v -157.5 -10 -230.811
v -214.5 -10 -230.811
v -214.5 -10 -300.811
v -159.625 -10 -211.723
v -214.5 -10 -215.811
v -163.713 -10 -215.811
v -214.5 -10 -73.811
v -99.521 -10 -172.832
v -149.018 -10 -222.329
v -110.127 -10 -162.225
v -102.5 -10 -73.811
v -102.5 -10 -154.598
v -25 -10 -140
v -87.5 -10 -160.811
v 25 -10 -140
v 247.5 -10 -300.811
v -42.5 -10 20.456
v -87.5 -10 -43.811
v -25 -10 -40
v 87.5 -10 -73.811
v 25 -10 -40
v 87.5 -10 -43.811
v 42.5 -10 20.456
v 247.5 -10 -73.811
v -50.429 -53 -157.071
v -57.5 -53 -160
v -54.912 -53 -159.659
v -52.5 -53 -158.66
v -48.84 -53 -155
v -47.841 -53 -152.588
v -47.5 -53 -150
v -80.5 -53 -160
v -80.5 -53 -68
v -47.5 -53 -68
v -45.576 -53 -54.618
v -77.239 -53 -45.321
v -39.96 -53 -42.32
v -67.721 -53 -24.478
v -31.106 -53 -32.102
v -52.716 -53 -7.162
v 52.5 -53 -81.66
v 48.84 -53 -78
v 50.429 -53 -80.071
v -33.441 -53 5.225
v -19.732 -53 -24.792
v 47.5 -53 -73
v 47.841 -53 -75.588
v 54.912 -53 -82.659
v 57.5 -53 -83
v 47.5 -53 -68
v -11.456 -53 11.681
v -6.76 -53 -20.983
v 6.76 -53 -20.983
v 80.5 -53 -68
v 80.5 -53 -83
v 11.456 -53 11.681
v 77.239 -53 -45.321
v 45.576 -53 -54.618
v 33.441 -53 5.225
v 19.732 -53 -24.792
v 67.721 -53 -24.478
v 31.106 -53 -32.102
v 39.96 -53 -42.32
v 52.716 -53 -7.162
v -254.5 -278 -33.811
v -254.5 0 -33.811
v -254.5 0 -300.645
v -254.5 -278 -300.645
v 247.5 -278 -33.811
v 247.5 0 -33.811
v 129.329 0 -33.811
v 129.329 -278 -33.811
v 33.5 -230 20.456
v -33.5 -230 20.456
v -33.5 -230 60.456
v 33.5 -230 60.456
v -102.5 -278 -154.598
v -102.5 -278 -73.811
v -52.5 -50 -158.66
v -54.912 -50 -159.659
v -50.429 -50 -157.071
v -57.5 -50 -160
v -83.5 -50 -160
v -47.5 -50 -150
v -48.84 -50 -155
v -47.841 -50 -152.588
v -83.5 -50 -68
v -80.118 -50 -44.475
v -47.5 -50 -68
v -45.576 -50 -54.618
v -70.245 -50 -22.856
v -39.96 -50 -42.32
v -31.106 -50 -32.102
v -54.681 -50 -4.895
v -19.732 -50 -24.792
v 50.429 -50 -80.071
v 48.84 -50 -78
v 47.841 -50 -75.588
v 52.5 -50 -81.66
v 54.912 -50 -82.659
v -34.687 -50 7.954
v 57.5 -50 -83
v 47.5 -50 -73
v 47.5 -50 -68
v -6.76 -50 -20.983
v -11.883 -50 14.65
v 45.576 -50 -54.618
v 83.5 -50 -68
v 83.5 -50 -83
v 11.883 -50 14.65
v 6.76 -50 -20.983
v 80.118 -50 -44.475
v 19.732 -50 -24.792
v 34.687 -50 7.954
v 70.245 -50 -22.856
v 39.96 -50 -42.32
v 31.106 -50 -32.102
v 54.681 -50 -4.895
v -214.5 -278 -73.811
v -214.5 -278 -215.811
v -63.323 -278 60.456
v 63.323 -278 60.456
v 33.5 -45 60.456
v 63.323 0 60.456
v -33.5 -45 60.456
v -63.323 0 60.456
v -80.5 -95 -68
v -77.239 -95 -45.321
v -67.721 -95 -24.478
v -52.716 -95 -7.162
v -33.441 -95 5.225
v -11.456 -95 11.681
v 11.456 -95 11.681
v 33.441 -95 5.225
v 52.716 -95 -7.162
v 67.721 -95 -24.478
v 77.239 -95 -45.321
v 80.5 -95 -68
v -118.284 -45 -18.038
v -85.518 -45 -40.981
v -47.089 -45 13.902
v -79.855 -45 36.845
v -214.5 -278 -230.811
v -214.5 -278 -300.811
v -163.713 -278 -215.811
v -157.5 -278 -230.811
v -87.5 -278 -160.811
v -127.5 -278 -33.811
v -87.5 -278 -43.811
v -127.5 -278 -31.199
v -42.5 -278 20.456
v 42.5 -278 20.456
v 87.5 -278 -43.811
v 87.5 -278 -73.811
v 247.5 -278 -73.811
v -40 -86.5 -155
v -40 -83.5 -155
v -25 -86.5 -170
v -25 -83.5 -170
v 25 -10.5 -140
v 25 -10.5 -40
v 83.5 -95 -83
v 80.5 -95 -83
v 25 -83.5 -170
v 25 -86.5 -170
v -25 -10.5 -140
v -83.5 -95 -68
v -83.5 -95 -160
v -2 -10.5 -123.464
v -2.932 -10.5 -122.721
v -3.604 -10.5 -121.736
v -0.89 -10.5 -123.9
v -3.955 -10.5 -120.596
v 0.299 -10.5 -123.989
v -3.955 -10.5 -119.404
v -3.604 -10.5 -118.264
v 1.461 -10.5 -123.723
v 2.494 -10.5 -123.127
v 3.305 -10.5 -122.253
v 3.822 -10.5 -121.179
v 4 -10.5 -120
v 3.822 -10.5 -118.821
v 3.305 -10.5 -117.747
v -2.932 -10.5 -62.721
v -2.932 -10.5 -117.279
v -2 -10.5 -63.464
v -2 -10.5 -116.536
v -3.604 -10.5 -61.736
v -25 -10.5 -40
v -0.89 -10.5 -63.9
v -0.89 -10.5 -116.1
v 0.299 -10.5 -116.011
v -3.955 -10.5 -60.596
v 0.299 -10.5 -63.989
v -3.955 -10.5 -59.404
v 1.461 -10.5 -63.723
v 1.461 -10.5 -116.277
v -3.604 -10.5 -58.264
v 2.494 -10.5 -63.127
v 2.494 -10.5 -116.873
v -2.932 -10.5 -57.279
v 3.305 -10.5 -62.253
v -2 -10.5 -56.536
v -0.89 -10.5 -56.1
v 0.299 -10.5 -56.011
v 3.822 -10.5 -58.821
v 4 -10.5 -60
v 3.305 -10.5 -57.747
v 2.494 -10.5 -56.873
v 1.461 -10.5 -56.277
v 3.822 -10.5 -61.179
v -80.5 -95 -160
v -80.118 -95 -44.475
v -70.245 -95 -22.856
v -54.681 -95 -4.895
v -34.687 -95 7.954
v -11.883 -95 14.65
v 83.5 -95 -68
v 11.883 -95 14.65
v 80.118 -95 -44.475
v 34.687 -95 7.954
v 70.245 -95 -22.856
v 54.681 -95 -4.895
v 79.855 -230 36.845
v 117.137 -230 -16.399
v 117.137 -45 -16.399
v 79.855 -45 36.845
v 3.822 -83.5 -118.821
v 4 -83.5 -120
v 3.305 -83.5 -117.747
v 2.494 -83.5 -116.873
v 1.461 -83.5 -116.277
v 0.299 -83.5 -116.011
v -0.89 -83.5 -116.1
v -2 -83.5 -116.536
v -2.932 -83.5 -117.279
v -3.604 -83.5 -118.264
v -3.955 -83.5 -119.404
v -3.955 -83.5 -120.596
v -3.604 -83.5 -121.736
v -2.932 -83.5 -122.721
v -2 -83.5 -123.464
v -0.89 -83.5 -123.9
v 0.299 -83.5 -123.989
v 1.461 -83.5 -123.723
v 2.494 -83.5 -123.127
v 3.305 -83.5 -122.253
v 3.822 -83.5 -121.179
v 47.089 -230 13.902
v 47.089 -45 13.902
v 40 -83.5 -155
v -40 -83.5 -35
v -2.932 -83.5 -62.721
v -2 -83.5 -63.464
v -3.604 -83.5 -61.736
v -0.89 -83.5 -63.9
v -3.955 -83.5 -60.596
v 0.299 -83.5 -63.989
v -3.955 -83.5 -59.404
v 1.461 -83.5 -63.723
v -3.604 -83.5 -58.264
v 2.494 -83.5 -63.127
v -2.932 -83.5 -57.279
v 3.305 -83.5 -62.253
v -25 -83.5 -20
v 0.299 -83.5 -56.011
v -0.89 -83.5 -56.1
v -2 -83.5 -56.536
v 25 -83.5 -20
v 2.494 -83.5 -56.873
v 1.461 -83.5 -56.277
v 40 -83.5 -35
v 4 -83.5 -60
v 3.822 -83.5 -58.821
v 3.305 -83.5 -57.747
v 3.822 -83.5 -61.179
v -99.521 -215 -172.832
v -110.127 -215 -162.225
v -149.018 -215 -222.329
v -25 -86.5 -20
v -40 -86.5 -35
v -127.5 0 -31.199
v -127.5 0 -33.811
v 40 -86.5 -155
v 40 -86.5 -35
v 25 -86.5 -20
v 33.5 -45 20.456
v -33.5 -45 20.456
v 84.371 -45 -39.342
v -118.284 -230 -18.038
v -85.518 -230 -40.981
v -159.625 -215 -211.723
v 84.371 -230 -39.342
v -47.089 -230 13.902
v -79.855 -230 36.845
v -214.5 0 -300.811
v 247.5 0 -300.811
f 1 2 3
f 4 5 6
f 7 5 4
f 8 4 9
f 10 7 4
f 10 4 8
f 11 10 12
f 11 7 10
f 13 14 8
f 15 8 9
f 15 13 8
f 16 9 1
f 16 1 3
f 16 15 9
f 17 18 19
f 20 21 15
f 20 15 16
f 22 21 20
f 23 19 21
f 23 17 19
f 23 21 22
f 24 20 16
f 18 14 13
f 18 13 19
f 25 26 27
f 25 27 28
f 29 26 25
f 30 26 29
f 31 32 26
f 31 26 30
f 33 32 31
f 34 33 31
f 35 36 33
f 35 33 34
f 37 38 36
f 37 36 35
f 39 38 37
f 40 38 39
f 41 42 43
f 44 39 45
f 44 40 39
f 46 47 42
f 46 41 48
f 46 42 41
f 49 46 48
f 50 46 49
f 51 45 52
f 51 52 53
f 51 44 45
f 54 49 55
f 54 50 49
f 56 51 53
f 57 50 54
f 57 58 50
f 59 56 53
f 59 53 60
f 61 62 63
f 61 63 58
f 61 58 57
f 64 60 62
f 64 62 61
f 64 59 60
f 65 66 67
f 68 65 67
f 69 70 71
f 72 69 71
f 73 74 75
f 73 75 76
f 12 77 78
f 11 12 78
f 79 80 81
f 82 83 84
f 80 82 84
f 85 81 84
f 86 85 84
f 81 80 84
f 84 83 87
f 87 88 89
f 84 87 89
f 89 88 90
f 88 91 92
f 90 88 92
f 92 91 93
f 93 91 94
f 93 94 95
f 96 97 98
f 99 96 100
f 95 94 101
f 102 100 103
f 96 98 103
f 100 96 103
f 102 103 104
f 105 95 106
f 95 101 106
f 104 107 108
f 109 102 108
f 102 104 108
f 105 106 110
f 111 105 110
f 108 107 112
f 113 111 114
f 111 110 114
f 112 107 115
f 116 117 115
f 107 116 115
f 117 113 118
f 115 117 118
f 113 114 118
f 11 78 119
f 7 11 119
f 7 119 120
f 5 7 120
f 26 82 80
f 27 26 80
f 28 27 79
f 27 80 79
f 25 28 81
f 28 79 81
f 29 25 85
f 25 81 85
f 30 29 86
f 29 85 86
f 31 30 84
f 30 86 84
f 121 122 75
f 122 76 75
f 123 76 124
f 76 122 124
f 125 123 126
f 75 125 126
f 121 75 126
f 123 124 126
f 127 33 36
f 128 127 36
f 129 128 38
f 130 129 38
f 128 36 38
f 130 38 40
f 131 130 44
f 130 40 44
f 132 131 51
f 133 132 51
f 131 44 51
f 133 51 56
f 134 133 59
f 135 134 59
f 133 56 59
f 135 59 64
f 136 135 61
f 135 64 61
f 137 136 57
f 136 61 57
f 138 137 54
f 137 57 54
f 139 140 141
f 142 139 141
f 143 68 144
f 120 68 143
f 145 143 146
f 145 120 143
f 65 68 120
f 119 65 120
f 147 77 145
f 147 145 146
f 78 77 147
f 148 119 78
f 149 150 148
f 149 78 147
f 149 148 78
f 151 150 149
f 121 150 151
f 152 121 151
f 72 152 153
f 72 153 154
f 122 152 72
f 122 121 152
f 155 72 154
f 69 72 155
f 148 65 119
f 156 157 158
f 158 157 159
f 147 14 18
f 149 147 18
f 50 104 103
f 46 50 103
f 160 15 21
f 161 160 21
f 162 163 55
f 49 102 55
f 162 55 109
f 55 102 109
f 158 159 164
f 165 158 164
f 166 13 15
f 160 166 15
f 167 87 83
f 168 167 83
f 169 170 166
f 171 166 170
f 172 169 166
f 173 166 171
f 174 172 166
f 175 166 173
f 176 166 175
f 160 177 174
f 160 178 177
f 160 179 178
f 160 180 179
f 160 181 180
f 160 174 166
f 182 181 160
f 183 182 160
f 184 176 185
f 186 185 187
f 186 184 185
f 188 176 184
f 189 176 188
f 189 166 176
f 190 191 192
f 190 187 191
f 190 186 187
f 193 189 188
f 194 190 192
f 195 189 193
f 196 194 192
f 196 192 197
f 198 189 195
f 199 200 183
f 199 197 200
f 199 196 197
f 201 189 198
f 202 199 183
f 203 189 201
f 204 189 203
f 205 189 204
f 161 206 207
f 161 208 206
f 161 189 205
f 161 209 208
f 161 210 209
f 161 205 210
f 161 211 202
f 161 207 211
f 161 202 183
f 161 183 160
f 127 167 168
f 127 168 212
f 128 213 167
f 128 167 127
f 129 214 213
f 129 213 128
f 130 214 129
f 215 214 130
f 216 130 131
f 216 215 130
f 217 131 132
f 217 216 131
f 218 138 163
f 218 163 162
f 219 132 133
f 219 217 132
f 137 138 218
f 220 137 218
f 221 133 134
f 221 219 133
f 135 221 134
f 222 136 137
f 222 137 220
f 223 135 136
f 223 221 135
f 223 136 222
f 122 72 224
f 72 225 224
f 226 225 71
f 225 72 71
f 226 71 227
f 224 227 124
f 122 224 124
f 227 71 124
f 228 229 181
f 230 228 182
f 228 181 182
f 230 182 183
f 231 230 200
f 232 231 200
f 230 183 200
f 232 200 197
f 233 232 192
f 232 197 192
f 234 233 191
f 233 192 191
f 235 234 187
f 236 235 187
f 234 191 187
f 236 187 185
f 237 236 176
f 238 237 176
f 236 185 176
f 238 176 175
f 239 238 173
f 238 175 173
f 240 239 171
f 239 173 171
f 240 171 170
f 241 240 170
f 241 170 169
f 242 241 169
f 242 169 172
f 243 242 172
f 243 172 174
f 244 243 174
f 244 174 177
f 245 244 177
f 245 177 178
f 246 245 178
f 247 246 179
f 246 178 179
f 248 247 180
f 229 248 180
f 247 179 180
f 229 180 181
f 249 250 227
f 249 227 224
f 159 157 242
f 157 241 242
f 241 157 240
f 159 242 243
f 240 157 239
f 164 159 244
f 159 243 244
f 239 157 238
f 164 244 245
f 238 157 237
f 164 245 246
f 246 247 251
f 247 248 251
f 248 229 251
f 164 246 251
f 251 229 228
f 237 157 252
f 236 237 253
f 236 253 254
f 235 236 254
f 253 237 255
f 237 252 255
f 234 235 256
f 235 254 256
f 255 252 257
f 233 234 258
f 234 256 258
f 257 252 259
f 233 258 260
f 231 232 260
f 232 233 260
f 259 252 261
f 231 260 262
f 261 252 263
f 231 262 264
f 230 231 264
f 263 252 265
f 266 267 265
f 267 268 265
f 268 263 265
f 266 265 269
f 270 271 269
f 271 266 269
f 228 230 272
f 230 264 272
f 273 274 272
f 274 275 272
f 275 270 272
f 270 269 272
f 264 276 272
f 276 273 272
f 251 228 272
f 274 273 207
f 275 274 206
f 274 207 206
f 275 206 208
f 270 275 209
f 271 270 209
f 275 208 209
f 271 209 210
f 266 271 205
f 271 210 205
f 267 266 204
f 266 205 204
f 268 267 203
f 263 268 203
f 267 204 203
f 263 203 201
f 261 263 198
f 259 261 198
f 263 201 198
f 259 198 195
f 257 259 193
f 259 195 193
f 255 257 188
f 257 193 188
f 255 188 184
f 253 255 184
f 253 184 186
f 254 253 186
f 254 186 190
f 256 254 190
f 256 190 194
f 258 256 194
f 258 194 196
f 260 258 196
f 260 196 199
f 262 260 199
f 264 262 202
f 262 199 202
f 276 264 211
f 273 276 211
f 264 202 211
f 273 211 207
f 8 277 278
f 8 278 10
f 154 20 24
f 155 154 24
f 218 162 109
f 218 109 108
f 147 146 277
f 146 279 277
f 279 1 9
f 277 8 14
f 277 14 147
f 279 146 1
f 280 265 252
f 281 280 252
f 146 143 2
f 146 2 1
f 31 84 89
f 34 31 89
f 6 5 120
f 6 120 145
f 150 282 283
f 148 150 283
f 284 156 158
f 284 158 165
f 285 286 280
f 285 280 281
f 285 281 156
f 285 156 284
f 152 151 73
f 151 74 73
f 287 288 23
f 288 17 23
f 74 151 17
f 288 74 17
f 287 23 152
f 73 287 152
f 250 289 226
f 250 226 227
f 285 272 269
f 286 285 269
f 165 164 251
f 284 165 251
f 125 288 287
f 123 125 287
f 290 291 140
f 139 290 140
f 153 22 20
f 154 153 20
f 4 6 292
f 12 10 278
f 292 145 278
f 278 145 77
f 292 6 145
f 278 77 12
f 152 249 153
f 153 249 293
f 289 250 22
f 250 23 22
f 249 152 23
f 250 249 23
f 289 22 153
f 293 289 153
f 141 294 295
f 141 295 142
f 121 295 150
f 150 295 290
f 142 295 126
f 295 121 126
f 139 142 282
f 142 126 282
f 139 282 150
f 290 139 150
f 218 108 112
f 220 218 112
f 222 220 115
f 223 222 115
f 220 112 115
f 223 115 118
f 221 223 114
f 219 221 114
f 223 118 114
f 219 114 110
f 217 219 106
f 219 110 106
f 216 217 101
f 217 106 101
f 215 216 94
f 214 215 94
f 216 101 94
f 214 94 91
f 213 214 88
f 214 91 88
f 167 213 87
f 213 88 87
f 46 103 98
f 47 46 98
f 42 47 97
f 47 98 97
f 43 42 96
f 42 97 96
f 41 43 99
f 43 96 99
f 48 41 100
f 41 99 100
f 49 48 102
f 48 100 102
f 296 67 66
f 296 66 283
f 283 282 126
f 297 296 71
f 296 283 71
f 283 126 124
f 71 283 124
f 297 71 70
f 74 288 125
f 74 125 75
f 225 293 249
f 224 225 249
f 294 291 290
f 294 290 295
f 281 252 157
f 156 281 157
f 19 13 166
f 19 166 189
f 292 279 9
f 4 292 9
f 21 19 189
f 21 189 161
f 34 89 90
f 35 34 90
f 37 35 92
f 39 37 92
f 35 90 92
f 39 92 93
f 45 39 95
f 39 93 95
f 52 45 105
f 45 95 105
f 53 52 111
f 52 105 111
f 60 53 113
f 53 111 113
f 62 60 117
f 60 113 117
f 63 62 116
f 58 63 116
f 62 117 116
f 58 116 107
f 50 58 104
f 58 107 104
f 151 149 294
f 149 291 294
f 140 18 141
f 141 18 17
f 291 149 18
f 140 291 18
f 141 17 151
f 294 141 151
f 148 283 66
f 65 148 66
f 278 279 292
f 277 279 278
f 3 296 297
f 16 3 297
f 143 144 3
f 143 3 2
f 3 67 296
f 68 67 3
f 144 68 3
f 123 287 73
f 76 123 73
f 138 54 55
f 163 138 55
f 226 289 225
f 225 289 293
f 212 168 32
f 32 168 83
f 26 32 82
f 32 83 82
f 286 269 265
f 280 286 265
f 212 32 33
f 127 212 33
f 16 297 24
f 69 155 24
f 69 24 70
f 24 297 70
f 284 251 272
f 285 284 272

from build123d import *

# Parameters (mm, degrees)
F1_DEPTH  = 10
F3_DEPTH  = 278
F4_W      = 67
F4_H      = 185
F5_DEPTH  = 50
F6_W      = 185
F6_H      = 67
F7_DEPTH  = 50
F8_W      = 185
F8_H      = 65
F9_DEPTH  = 50
F11_DEPTH = 278
F13_DEPTH = 268
F14_W     = 205
F14_H     = 70
F15_DEPTH = 25
F18_DEPTH = 3
F20_DEPTH = 42
F21_W     = 50
F21_H     = 100
F22_DEPTH = 0.5
F23_R     = 4
F24_DEPTH = 73
F26_DEPTH = 3


with BuildPart() as f1:
    # F0 (on Front) → F1 (new body)
    with BuildSketch(Plane.XZ):
        Polygon((-214.5, -230.8110243468), (-214.5, -300.8110243468), (247.5, -300.8110243468), (247.5, -73.8110243468), (87.5, -73.8110243468), (87.5, -43.8110243468), (42.5, 20.4556359566), (-42.5, 20.4556359566), (-87.5, -43.8110243468), (-87.5, -160.8110243468), (-157.5, -230.8110243468), align=None)
    extrude(amount=F1_DEPTH)

    # F2 (on Front) → F3 (join)
    with BuildSketch(Plane.XZ):
        Polygon((87.5, -43.8110243468), (87.5, -73.8110243468), (247.5, -73.8110243468), (247.5, -33.8110243468), (129.3289081684, -33.8110243468), (63.3226820221, 60.4556359566), (-63.3226820221, 60.4556359566), (-127.5, -31.1990727916), (-127.5, -179.5978209112), (-163.7132034356, -215.8110243468), (-214.5, -215.8110243468), (-214.5, -230.8110243468), (-157.5, -230.8110243468), (-87.5, -160.8110243468), (-87.5, -43.8110243468), (-42.5, 20.4556359566), (42.5, 20.4556359566), align=None)
    extrude(amount=F3_DEPTH)

    # F4 (on face) → F5 (cut)
    with BuildSketch(Plane(origin=(0, 0, 20.4556359566), x_dir=(1, 0, 0), z_dir=(0, 0, -1))):
        with Locations((0, 137.5)):
            Rectangle(F4_W, F4_H)
    extrude(amount=-F5_DEPTH, mode=Mode.SUBTRACT)

    # F6 (on face) → F7 (cut)
    with BuildSketch(Plane(origin=(-38.1289331266, 0, 26.6981663992), x_dir=(0, 1, 0), z_dir=(0.8191520443, 0, -0.5735764364))):
        with Locations((-137.5, -49.1207225338)):
            Rectangle(F6_W, F6_H)
    extrude(amount=-F7_DEPTH, mode=Mode.SUBTRACT)

    # F8 (on face) → F9 (cut)
    with BuildSketch(Plane(origin=(38.1289331266, 0, 26.6981663992), x_dir=(0, -1, 0), z_dir=(-0.8191520443, 0, -0.5735764364))):
        with Locations((137.5, -48.1207225338)):
            Rectangle(F8_W, F8_H)
    extrude(amount=-F9_DEPTH, mode=Mode.SUBTRACT)

    # F10 (on face) → F11 (join)
    with BuildSketch(Plane.XZ.offset(278)):
        Polygon((-127.5, -179.5978209112), (-127.5, -33.8110243468), (-254.5, -33.8110243468), (-254.5, -300.6454706192), (-214.5, -300.8110243468), (-214.5, -230.8110243468), (-214.5, -215.8110243468), (-163.7132034356, -215.8110243468), align=None)
    extrude(amount=-F11_DEPTH)

    # F12 (on face) → F13 (cut)
    with BuildSketch(Plane.XZ.offset(278)):
        Polygon((-214.5, -73.8110243468), (-214.5, -215.8110243468), (-163.7132034356, -215.8110243468), (-102.5, -154.5978209112), (-102.5, -73.8110243468), align=None)
    extrude(amount=-F13_DEPTH, mode=Mode.SUBTRACT)

    # F14 (on face) → F15 (cut)
    with BuildSketch(Plane(origin=(36.6555121734, 0, -36.6555121734), x_dir=(0, 1, 0), z_dir=(0.7071067812, 0, -0.7071067812))):
        with Locations((-112.5, -227.582409159)):
            Rectangle(F14_W, F14_H)
    extrude(amount=-F15_DEPTH, mode=Mode.SUBTRACT)

    # F21 (on face) → F22 (join)
    with BuildSketch(Plane.XZ.offset(10)):
        with Locations((0, -90)):
            Rectangle(F21_W, F21_H)
    extrude(amount=F22_DEPTH)

    # F23 (on face) → F24 (join)
    with BuildSketch(Plane.XZ.offset(10.5)):
        with Locations((0, -60)):
            Circle(F23_R)
        with Locations((0, -120)):
            Circle(F23_R)
    extrude(amount=F24_DEPTH)

    # F25 (on face) → F26 (join)
    with BuildSketch(Plane.XZ.offset(83.5)):
        Polygon((25, -20), (-25, -20), (-40, -35), (-40, -155), (-25, -170), (25, -170), (40, -155), (40, -35), align=None)
    extrude(amount=F26_DEPTH)


with BuildPart() as f18:
    # F17 (on offset) → F18 (new body)
    with BuildSketch(Plane.XZ.offset(50)):
        with BuildLine():
            ThreePointArc((-47.5, -68), (0, -20.5), (47.5, -68))
            Line((47.5, -68), (47.5, -73))
            ThreePointArc((47.5, -73), (50.4289321881, -80.0710678119), (57.5, -83))
            Line((57.5, -83), (83.5, -83))
            Line((83.5, -83), (83.5, -68))
            ThreePointArc((83.5, -68), (0, 15.5), (-83.5, -68))
            Line((-83.5, -68), (-83.5, -160))
            Line((-83.5, -160), (-57.5, -160))
            ThreePointArc((-57.5, -160), (-50.4289321881, -157.0710678119), (-47.5, -150))
            Line((-47.5, -150), (-47.5, -68))
        make_face()
    extrude(amount=F18_DEPTH)

    # F19 (on face) → F20 (join)
    with BuildSketch(Plane.XZ.offset(53)):
        with BuildLine():
            Line((-83.5, -68), (-83.5, -160))
            Line((-83.5, -160), (-80.5, -160))
            Line((-80.5, -160), (-80.5, -68))
            ThreePointArc((-80.5, -68), (0, 12.5), (80.5, -68))
            Line((80.5, -68), (80.5, -83))
            Line((80.5, -83), (83.5, -83))
            Line((83.5, -83), (83.5, -68))
            ThreePointArc((83.5, -68), (0, 15.5), (-83.5, -68))
        make_face()
    extrude(amount=F20_DEPTH)


solid = Compound([f1.part, f18.part])
